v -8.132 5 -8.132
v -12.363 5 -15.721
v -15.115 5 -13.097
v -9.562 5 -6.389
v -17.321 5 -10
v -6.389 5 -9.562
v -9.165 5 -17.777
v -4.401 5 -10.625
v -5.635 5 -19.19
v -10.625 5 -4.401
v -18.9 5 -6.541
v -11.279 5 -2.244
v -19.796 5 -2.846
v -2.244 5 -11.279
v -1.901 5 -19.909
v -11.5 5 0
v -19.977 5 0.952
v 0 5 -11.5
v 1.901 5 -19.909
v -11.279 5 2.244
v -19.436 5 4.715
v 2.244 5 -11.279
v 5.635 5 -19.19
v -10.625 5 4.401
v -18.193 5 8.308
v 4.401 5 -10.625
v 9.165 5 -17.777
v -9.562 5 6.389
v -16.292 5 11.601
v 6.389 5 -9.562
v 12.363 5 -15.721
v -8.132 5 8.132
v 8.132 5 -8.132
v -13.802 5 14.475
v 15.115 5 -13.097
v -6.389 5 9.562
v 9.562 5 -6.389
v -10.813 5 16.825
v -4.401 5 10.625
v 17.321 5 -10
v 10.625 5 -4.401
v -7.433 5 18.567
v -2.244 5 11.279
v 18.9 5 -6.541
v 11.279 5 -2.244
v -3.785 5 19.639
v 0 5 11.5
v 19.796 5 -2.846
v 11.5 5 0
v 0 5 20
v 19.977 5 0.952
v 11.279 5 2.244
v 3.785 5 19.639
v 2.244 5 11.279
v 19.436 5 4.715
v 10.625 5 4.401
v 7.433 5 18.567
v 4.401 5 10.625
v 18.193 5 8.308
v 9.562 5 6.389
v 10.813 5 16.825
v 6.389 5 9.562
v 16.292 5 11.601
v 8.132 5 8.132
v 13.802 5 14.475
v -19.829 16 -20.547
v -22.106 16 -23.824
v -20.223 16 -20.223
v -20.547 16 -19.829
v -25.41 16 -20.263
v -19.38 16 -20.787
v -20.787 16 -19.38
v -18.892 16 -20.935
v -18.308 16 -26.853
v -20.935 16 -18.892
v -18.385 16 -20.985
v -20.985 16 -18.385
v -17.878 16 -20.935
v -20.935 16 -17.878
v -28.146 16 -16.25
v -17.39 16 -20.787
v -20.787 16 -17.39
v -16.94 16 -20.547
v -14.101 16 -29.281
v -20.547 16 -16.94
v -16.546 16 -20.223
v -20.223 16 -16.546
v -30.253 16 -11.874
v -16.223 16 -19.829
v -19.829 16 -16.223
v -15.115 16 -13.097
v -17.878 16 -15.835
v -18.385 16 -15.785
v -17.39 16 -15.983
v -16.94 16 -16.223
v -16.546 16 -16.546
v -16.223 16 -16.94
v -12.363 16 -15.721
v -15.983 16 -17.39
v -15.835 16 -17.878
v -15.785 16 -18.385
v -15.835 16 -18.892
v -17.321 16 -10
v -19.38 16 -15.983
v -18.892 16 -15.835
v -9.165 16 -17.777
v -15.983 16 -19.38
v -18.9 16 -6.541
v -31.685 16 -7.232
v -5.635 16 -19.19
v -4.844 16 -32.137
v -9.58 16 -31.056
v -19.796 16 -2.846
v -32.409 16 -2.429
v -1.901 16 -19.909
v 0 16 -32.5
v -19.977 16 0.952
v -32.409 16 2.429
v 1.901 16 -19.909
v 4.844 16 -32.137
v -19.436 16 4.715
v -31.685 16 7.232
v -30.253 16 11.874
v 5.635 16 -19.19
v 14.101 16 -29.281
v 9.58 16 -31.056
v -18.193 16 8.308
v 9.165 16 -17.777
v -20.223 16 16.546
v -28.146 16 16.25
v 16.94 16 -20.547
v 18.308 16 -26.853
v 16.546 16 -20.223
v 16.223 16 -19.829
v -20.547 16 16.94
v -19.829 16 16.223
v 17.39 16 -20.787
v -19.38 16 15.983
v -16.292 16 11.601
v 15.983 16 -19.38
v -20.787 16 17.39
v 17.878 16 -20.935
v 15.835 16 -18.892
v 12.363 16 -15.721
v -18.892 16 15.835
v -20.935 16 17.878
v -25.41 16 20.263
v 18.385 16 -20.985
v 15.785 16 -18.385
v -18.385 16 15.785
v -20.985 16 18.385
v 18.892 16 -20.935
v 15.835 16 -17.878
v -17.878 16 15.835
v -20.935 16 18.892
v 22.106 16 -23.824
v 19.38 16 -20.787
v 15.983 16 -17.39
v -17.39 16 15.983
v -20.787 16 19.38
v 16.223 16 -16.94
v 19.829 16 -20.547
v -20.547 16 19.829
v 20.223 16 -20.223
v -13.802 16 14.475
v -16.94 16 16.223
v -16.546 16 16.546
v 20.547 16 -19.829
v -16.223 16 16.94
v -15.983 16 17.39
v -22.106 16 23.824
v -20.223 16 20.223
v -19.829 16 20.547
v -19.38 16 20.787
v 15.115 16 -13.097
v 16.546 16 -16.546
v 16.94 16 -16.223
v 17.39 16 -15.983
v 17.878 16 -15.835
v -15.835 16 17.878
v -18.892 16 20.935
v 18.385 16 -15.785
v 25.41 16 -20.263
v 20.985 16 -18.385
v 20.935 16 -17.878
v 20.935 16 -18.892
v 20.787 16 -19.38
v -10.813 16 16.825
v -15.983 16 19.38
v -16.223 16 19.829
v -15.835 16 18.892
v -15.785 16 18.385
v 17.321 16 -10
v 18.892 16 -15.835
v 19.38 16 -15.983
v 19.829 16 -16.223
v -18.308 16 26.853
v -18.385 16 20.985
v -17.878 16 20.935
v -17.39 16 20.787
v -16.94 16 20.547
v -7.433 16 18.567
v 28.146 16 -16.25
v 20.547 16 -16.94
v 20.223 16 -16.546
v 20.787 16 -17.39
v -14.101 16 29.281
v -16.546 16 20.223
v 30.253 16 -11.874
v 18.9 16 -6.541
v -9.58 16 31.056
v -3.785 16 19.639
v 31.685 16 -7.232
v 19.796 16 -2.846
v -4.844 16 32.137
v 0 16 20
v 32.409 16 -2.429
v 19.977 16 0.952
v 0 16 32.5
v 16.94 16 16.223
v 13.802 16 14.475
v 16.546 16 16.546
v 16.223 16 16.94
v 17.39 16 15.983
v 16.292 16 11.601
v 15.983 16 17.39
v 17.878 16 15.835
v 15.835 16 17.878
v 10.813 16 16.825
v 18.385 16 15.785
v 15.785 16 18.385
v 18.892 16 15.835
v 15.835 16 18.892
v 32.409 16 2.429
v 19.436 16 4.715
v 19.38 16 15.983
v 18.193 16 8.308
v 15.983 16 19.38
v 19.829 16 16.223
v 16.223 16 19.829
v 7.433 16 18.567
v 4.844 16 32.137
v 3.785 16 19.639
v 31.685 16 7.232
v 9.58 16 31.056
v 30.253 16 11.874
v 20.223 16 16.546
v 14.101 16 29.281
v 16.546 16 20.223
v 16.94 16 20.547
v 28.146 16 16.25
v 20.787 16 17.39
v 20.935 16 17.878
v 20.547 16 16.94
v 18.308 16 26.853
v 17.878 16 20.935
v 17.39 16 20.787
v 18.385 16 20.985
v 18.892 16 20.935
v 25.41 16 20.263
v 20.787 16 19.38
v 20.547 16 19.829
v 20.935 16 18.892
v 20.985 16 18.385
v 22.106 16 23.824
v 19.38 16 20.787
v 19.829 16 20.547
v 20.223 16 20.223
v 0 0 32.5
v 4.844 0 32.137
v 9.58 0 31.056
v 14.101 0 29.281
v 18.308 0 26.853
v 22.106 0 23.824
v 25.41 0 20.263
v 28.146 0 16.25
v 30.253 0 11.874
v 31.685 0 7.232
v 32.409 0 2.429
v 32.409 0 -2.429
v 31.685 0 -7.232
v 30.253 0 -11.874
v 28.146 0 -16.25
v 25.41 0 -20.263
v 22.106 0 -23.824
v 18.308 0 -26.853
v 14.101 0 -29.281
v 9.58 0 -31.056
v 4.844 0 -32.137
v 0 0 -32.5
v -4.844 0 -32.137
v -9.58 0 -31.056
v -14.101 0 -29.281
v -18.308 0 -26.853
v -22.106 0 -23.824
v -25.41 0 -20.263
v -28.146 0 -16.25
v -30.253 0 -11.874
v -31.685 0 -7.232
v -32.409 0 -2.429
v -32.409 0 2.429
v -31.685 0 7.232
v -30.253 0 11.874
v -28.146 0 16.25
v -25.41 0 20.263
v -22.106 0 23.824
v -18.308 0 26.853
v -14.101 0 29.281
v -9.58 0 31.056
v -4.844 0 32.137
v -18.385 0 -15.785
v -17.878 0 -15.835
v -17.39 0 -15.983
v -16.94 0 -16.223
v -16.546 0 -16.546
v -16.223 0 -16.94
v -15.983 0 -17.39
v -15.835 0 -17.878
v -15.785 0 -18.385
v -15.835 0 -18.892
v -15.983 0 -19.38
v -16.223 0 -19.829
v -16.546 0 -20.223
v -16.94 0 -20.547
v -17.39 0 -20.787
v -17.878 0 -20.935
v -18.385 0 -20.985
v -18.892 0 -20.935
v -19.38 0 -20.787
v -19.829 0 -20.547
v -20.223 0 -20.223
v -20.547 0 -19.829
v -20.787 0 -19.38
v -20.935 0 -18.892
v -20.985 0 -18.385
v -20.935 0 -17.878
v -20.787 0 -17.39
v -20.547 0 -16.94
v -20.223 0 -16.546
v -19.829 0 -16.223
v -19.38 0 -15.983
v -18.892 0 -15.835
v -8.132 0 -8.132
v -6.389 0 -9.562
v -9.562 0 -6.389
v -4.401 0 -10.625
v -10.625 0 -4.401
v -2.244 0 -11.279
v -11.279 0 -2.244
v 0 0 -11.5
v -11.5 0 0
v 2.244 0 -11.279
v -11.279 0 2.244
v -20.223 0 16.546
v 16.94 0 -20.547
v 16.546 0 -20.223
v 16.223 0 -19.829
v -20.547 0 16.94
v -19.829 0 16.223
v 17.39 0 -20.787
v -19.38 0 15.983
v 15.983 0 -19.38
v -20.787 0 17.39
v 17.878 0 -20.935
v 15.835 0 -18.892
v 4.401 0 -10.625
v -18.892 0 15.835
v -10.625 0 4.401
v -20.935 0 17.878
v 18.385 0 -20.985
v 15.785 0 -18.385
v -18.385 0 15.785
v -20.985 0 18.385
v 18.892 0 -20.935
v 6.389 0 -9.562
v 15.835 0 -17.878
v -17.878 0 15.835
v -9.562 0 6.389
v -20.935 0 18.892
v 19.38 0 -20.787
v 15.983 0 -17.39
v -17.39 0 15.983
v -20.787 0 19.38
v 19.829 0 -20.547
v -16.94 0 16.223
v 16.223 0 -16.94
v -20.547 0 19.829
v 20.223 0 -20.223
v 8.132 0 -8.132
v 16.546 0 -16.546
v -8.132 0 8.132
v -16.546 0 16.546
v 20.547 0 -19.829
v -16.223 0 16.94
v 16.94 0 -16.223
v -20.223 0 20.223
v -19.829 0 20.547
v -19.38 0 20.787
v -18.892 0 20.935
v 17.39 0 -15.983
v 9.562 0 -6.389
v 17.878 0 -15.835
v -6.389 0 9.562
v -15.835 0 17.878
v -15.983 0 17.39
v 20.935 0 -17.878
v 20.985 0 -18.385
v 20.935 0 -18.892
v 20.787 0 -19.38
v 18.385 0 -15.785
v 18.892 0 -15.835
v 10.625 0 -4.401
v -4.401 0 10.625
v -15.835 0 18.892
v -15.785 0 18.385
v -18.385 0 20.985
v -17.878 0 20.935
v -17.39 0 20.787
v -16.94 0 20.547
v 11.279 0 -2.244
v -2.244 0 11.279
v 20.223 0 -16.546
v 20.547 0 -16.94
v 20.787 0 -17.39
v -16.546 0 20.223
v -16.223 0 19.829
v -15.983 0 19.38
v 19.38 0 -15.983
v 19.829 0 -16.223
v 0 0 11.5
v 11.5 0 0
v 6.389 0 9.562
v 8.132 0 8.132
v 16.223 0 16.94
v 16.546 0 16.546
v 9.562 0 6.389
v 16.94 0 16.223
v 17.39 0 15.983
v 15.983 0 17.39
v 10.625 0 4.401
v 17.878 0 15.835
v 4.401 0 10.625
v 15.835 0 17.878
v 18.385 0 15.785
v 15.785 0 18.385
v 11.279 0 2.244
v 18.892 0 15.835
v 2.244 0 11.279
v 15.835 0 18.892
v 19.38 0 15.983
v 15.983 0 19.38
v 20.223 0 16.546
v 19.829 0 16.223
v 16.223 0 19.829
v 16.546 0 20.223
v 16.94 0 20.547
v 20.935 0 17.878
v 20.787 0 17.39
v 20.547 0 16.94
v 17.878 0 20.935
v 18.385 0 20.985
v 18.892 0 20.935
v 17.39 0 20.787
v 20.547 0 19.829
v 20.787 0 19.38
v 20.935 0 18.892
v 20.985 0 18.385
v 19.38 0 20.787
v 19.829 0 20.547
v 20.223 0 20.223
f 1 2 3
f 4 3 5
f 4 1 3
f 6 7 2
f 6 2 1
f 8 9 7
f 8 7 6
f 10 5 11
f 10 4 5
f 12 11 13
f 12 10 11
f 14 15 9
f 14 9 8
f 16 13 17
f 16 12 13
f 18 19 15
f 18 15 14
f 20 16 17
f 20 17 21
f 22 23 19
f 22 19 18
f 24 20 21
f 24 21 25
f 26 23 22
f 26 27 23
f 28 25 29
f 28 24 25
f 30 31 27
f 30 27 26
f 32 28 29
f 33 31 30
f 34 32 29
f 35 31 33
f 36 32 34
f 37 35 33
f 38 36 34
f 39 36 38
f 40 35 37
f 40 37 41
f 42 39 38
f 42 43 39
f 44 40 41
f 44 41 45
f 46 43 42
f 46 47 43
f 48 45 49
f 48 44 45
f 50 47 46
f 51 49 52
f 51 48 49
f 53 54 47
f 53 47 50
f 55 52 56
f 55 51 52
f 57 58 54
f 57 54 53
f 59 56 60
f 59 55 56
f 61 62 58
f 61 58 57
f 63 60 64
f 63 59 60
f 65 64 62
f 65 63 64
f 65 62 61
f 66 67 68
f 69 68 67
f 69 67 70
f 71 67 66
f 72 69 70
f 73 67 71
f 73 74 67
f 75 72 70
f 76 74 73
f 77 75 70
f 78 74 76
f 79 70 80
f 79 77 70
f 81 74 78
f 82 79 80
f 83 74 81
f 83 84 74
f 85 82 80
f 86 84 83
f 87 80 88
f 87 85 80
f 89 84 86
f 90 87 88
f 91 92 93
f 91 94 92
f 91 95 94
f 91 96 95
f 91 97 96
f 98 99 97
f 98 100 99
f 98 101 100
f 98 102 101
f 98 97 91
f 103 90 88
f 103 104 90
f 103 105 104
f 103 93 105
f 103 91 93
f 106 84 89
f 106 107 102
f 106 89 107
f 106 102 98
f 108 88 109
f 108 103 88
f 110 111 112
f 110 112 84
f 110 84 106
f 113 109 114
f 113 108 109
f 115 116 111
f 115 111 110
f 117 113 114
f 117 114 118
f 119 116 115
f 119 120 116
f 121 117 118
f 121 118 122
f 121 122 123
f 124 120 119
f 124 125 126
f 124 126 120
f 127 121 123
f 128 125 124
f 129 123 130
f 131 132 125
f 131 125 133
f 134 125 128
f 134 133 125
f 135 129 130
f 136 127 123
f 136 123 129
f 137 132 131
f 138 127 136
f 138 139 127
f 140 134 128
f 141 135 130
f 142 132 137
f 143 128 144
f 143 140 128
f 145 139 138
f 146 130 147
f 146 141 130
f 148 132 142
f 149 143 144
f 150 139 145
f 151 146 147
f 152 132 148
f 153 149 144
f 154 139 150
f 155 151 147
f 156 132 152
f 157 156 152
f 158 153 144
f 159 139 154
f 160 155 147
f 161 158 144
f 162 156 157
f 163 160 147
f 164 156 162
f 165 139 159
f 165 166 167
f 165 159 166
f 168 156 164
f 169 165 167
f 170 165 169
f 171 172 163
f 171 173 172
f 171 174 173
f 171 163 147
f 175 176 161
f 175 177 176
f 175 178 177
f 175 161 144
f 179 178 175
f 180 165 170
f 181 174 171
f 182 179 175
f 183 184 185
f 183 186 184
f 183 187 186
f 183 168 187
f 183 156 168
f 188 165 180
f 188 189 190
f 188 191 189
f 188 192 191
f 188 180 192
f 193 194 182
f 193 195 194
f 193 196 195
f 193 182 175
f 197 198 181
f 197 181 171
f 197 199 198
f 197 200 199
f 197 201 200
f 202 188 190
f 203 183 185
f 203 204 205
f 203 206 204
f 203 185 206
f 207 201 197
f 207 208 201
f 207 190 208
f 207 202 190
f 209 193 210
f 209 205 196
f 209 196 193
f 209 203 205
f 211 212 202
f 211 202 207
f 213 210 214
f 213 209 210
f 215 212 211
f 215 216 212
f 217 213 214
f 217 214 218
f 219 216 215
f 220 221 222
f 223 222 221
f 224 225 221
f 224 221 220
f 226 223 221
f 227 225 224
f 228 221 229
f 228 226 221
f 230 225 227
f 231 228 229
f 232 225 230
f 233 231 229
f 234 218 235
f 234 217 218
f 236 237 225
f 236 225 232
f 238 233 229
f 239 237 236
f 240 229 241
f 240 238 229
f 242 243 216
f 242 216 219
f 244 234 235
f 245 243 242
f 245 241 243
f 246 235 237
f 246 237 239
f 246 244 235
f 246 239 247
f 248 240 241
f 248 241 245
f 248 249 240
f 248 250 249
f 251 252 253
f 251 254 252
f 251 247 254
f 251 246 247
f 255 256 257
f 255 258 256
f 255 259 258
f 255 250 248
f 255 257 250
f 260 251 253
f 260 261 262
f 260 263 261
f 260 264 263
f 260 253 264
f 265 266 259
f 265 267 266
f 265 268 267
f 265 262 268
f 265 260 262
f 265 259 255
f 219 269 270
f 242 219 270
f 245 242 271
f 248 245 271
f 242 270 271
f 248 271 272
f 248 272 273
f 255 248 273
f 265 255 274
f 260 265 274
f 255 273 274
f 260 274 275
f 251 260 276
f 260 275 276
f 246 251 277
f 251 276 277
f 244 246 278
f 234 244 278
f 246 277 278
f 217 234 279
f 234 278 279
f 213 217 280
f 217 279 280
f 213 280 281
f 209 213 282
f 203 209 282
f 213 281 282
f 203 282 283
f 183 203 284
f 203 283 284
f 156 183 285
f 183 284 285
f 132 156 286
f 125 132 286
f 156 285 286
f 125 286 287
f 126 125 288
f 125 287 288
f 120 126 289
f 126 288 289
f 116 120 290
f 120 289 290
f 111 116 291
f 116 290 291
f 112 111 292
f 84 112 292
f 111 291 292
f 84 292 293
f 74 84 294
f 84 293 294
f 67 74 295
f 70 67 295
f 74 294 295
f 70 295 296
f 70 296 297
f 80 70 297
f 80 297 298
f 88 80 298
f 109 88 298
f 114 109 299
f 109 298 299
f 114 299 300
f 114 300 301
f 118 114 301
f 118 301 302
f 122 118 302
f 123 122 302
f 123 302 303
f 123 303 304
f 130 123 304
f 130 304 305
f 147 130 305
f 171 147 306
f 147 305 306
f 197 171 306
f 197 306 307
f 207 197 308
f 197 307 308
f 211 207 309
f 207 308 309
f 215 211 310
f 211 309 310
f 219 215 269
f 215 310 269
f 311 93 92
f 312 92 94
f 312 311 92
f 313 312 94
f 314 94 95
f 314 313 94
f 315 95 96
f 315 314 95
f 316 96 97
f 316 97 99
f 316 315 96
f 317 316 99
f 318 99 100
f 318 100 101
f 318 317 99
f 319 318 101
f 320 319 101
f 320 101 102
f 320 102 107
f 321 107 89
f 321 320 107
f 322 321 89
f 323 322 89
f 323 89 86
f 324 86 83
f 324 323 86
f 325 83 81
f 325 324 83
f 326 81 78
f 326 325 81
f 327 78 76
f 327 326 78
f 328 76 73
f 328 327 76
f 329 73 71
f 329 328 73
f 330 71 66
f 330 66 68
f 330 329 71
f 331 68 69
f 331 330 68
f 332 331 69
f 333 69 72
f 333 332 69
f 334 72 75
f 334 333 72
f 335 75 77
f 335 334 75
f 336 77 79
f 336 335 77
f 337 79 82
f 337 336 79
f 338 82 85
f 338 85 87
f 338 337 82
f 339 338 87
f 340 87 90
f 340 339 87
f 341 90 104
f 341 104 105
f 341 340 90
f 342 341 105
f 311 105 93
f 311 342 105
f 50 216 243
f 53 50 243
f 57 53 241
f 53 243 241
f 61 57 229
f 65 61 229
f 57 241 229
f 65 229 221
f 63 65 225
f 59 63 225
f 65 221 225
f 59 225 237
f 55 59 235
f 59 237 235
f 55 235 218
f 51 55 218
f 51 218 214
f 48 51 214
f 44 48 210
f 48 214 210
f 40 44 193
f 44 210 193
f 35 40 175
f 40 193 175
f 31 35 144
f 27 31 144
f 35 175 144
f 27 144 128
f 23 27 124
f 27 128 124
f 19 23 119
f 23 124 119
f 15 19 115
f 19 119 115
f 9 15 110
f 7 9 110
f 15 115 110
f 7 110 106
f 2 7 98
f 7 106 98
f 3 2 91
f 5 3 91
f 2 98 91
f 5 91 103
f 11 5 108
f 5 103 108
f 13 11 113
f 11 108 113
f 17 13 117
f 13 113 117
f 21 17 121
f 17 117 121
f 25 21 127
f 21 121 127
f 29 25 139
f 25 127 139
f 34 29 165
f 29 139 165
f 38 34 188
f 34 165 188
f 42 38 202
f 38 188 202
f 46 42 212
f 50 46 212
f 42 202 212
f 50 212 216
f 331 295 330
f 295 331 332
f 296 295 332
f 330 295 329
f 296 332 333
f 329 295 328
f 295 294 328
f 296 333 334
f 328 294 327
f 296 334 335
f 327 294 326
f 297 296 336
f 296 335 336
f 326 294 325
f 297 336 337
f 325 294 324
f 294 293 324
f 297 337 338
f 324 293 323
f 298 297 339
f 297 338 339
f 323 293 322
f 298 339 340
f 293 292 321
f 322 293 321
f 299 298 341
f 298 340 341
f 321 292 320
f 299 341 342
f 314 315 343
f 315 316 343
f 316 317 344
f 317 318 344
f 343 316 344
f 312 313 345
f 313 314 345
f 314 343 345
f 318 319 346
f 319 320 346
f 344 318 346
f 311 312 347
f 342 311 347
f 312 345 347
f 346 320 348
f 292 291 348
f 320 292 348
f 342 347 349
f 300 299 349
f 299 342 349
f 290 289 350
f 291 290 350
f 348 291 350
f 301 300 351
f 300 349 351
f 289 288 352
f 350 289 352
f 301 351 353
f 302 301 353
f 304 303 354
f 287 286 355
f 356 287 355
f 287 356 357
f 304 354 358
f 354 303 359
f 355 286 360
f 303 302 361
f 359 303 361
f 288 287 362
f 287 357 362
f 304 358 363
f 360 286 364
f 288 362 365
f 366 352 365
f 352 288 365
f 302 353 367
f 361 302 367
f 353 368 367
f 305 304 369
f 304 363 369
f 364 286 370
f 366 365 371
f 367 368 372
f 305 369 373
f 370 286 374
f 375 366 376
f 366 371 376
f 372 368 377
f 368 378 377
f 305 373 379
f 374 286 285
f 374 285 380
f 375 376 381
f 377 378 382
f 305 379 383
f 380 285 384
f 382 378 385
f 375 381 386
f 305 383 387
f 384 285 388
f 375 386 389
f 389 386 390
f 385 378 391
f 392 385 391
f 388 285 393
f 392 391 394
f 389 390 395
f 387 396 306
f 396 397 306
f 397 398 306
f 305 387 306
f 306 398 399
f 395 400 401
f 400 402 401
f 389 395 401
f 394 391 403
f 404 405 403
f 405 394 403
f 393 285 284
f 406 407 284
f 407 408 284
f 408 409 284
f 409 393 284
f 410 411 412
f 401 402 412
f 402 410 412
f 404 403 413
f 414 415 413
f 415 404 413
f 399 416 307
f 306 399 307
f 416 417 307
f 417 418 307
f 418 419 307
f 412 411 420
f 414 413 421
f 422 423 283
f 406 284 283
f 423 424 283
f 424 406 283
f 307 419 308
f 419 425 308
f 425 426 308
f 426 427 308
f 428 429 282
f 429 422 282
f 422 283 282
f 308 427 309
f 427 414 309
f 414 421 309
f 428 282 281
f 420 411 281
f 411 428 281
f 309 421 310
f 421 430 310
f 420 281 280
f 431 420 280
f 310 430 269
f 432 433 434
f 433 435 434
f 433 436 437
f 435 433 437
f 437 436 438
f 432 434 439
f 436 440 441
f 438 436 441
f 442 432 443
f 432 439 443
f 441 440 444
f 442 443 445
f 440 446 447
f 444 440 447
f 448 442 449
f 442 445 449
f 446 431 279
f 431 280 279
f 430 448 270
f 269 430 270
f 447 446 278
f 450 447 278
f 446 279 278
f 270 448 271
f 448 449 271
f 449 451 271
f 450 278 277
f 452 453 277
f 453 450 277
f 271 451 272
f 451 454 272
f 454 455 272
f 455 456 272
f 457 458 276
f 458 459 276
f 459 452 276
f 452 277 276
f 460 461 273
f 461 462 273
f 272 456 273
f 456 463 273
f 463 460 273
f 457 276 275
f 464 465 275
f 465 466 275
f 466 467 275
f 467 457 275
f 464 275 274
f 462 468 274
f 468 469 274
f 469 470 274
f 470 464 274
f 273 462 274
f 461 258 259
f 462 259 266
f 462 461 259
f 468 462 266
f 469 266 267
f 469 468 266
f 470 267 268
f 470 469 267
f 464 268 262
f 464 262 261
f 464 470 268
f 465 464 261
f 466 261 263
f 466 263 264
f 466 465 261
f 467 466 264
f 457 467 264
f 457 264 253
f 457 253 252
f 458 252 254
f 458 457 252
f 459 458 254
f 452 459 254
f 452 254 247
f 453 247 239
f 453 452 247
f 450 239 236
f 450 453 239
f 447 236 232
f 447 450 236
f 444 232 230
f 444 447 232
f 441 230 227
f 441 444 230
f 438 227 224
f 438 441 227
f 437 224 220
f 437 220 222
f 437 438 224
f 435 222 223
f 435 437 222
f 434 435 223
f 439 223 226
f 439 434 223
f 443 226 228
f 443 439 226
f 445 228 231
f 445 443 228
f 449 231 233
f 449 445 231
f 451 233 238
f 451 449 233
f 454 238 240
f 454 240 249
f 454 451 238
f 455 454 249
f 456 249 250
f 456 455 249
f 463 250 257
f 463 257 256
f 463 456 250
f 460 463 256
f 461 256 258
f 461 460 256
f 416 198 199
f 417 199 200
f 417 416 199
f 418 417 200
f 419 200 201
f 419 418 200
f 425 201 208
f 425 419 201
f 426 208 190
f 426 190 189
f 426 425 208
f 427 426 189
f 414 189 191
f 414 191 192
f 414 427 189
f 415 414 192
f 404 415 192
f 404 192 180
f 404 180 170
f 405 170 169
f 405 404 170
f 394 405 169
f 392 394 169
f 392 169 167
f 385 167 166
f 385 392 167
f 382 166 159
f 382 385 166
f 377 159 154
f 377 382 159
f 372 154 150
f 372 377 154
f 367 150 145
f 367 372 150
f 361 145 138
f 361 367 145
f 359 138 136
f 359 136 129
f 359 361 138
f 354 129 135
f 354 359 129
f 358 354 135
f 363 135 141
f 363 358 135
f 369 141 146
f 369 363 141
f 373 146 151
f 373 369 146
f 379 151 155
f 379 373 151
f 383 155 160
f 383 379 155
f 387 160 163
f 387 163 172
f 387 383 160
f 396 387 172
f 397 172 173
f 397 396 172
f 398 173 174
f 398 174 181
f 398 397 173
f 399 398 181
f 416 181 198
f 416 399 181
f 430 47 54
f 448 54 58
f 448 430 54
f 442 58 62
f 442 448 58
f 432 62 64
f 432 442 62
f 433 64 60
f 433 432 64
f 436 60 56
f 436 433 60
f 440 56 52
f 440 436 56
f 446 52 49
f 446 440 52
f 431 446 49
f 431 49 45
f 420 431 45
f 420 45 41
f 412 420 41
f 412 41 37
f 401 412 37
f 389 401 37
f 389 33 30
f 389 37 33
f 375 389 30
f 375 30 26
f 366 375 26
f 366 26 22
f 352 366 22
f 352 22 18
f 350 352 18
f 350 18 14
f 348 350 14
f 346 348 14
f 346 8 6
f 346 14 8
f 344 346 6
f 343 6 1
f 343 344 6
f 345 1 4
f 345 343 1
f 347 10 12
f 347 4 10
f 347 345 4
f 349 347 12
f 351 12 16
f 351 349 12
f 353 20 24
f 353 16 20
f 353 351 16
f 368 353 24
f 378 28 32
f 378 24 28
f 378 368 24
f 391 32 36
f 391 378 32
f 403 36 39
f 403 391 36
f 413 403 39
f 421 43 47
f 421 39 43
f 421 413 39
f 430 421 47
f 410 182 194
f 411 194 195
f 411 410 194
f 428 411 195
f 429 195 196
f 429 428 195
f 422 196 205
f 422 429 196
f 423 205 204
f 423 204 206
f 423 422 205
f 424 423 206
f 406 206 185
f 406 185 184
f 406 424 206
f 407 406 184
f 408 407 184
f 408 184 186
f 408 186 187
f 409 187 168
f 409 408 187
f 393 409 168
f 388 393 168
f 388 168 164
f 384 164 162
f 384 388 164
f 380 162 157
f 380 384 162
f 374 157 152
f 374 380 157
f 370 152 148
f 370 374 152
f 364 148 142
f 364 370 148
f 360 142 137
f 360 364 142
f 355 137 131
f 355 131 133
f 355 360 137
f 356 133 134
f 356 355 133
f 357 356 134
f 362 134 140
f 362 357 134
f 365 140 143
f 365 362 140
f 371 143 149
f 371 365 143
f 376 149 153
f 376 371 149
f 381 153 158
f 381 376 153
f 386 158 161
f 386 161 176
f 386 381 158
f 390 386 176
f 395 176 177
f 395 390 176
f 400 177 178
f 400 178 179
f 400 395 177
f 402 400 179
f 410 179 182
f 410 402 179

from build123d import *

# Parameters (mm, degrees)
SKETCH1_R           = 32.5
SKETCH1_R_2         = 11.5
SKETCH1_R_3         = 2.6
BOSS_EXTRUDE1_DEPTH = 16
SKETCH2_R           = 20
CUT_EXTRUDE1_DEPTH  = 11


with BuildPart() as part:
    # Sketch1 → Boss-Extrude1 (new body)
    with BuildSketch(Plane(origin=(0, 0, 0), x_dir=(1, 0, 0), z_dir=(0, 1, 0))):
        with Locations(Location((0, 0, 0), (0, 0, 270))):
            Circle(SKETCH1_R)
        with Locations(Location((0, 0, 0), (0, 0, 270))):
            Circle(SKETCH1_R_2, mode=Mode.SUBTRACT)
        with Locations(Location((18.384776311, -18.384776311, 0), (0, 0, 270))):
            Circle(SKETCH1_R_3, mode=Mode.SUBTRACT)
        with Locations(Location((-18.384776311, -18.384776311, 0), (0, 0, 270))):
            Circle(SKETCH1_R_3, mode=Mode.SUBTRACT)
        with Locations(Location((-18.384776311, 18.384776311, 0), (0, 0, 270))):
            Circle(SKETCH1_R_3, mode=Mode.SUBTRACT)
        with Locations(Location((18.384776311, 18.384776311, 0), (0, 0, 270))):
            Circle(SKETCH1_R_3, mode=Mode.SUBTRACT)
    extrude(amount=BOSS_EXTRUDE1_DEPTH)

    # Sketch2 → Cut-Extrude1 (cut)
    with BuildSketch(Plane(origin=(0, 16, 0), x_dir=(1, 0, 0), z_dir=(0, 1, 0))):
        with Locations(Location((0, 0, 0), (0, 0, 270))):
            Circle(SKETCH2_R)
    extrude(amount=-CUT_EXTRUDE1_DEPTH, mode=Mode.SUBTRACT)


solid = part.part
